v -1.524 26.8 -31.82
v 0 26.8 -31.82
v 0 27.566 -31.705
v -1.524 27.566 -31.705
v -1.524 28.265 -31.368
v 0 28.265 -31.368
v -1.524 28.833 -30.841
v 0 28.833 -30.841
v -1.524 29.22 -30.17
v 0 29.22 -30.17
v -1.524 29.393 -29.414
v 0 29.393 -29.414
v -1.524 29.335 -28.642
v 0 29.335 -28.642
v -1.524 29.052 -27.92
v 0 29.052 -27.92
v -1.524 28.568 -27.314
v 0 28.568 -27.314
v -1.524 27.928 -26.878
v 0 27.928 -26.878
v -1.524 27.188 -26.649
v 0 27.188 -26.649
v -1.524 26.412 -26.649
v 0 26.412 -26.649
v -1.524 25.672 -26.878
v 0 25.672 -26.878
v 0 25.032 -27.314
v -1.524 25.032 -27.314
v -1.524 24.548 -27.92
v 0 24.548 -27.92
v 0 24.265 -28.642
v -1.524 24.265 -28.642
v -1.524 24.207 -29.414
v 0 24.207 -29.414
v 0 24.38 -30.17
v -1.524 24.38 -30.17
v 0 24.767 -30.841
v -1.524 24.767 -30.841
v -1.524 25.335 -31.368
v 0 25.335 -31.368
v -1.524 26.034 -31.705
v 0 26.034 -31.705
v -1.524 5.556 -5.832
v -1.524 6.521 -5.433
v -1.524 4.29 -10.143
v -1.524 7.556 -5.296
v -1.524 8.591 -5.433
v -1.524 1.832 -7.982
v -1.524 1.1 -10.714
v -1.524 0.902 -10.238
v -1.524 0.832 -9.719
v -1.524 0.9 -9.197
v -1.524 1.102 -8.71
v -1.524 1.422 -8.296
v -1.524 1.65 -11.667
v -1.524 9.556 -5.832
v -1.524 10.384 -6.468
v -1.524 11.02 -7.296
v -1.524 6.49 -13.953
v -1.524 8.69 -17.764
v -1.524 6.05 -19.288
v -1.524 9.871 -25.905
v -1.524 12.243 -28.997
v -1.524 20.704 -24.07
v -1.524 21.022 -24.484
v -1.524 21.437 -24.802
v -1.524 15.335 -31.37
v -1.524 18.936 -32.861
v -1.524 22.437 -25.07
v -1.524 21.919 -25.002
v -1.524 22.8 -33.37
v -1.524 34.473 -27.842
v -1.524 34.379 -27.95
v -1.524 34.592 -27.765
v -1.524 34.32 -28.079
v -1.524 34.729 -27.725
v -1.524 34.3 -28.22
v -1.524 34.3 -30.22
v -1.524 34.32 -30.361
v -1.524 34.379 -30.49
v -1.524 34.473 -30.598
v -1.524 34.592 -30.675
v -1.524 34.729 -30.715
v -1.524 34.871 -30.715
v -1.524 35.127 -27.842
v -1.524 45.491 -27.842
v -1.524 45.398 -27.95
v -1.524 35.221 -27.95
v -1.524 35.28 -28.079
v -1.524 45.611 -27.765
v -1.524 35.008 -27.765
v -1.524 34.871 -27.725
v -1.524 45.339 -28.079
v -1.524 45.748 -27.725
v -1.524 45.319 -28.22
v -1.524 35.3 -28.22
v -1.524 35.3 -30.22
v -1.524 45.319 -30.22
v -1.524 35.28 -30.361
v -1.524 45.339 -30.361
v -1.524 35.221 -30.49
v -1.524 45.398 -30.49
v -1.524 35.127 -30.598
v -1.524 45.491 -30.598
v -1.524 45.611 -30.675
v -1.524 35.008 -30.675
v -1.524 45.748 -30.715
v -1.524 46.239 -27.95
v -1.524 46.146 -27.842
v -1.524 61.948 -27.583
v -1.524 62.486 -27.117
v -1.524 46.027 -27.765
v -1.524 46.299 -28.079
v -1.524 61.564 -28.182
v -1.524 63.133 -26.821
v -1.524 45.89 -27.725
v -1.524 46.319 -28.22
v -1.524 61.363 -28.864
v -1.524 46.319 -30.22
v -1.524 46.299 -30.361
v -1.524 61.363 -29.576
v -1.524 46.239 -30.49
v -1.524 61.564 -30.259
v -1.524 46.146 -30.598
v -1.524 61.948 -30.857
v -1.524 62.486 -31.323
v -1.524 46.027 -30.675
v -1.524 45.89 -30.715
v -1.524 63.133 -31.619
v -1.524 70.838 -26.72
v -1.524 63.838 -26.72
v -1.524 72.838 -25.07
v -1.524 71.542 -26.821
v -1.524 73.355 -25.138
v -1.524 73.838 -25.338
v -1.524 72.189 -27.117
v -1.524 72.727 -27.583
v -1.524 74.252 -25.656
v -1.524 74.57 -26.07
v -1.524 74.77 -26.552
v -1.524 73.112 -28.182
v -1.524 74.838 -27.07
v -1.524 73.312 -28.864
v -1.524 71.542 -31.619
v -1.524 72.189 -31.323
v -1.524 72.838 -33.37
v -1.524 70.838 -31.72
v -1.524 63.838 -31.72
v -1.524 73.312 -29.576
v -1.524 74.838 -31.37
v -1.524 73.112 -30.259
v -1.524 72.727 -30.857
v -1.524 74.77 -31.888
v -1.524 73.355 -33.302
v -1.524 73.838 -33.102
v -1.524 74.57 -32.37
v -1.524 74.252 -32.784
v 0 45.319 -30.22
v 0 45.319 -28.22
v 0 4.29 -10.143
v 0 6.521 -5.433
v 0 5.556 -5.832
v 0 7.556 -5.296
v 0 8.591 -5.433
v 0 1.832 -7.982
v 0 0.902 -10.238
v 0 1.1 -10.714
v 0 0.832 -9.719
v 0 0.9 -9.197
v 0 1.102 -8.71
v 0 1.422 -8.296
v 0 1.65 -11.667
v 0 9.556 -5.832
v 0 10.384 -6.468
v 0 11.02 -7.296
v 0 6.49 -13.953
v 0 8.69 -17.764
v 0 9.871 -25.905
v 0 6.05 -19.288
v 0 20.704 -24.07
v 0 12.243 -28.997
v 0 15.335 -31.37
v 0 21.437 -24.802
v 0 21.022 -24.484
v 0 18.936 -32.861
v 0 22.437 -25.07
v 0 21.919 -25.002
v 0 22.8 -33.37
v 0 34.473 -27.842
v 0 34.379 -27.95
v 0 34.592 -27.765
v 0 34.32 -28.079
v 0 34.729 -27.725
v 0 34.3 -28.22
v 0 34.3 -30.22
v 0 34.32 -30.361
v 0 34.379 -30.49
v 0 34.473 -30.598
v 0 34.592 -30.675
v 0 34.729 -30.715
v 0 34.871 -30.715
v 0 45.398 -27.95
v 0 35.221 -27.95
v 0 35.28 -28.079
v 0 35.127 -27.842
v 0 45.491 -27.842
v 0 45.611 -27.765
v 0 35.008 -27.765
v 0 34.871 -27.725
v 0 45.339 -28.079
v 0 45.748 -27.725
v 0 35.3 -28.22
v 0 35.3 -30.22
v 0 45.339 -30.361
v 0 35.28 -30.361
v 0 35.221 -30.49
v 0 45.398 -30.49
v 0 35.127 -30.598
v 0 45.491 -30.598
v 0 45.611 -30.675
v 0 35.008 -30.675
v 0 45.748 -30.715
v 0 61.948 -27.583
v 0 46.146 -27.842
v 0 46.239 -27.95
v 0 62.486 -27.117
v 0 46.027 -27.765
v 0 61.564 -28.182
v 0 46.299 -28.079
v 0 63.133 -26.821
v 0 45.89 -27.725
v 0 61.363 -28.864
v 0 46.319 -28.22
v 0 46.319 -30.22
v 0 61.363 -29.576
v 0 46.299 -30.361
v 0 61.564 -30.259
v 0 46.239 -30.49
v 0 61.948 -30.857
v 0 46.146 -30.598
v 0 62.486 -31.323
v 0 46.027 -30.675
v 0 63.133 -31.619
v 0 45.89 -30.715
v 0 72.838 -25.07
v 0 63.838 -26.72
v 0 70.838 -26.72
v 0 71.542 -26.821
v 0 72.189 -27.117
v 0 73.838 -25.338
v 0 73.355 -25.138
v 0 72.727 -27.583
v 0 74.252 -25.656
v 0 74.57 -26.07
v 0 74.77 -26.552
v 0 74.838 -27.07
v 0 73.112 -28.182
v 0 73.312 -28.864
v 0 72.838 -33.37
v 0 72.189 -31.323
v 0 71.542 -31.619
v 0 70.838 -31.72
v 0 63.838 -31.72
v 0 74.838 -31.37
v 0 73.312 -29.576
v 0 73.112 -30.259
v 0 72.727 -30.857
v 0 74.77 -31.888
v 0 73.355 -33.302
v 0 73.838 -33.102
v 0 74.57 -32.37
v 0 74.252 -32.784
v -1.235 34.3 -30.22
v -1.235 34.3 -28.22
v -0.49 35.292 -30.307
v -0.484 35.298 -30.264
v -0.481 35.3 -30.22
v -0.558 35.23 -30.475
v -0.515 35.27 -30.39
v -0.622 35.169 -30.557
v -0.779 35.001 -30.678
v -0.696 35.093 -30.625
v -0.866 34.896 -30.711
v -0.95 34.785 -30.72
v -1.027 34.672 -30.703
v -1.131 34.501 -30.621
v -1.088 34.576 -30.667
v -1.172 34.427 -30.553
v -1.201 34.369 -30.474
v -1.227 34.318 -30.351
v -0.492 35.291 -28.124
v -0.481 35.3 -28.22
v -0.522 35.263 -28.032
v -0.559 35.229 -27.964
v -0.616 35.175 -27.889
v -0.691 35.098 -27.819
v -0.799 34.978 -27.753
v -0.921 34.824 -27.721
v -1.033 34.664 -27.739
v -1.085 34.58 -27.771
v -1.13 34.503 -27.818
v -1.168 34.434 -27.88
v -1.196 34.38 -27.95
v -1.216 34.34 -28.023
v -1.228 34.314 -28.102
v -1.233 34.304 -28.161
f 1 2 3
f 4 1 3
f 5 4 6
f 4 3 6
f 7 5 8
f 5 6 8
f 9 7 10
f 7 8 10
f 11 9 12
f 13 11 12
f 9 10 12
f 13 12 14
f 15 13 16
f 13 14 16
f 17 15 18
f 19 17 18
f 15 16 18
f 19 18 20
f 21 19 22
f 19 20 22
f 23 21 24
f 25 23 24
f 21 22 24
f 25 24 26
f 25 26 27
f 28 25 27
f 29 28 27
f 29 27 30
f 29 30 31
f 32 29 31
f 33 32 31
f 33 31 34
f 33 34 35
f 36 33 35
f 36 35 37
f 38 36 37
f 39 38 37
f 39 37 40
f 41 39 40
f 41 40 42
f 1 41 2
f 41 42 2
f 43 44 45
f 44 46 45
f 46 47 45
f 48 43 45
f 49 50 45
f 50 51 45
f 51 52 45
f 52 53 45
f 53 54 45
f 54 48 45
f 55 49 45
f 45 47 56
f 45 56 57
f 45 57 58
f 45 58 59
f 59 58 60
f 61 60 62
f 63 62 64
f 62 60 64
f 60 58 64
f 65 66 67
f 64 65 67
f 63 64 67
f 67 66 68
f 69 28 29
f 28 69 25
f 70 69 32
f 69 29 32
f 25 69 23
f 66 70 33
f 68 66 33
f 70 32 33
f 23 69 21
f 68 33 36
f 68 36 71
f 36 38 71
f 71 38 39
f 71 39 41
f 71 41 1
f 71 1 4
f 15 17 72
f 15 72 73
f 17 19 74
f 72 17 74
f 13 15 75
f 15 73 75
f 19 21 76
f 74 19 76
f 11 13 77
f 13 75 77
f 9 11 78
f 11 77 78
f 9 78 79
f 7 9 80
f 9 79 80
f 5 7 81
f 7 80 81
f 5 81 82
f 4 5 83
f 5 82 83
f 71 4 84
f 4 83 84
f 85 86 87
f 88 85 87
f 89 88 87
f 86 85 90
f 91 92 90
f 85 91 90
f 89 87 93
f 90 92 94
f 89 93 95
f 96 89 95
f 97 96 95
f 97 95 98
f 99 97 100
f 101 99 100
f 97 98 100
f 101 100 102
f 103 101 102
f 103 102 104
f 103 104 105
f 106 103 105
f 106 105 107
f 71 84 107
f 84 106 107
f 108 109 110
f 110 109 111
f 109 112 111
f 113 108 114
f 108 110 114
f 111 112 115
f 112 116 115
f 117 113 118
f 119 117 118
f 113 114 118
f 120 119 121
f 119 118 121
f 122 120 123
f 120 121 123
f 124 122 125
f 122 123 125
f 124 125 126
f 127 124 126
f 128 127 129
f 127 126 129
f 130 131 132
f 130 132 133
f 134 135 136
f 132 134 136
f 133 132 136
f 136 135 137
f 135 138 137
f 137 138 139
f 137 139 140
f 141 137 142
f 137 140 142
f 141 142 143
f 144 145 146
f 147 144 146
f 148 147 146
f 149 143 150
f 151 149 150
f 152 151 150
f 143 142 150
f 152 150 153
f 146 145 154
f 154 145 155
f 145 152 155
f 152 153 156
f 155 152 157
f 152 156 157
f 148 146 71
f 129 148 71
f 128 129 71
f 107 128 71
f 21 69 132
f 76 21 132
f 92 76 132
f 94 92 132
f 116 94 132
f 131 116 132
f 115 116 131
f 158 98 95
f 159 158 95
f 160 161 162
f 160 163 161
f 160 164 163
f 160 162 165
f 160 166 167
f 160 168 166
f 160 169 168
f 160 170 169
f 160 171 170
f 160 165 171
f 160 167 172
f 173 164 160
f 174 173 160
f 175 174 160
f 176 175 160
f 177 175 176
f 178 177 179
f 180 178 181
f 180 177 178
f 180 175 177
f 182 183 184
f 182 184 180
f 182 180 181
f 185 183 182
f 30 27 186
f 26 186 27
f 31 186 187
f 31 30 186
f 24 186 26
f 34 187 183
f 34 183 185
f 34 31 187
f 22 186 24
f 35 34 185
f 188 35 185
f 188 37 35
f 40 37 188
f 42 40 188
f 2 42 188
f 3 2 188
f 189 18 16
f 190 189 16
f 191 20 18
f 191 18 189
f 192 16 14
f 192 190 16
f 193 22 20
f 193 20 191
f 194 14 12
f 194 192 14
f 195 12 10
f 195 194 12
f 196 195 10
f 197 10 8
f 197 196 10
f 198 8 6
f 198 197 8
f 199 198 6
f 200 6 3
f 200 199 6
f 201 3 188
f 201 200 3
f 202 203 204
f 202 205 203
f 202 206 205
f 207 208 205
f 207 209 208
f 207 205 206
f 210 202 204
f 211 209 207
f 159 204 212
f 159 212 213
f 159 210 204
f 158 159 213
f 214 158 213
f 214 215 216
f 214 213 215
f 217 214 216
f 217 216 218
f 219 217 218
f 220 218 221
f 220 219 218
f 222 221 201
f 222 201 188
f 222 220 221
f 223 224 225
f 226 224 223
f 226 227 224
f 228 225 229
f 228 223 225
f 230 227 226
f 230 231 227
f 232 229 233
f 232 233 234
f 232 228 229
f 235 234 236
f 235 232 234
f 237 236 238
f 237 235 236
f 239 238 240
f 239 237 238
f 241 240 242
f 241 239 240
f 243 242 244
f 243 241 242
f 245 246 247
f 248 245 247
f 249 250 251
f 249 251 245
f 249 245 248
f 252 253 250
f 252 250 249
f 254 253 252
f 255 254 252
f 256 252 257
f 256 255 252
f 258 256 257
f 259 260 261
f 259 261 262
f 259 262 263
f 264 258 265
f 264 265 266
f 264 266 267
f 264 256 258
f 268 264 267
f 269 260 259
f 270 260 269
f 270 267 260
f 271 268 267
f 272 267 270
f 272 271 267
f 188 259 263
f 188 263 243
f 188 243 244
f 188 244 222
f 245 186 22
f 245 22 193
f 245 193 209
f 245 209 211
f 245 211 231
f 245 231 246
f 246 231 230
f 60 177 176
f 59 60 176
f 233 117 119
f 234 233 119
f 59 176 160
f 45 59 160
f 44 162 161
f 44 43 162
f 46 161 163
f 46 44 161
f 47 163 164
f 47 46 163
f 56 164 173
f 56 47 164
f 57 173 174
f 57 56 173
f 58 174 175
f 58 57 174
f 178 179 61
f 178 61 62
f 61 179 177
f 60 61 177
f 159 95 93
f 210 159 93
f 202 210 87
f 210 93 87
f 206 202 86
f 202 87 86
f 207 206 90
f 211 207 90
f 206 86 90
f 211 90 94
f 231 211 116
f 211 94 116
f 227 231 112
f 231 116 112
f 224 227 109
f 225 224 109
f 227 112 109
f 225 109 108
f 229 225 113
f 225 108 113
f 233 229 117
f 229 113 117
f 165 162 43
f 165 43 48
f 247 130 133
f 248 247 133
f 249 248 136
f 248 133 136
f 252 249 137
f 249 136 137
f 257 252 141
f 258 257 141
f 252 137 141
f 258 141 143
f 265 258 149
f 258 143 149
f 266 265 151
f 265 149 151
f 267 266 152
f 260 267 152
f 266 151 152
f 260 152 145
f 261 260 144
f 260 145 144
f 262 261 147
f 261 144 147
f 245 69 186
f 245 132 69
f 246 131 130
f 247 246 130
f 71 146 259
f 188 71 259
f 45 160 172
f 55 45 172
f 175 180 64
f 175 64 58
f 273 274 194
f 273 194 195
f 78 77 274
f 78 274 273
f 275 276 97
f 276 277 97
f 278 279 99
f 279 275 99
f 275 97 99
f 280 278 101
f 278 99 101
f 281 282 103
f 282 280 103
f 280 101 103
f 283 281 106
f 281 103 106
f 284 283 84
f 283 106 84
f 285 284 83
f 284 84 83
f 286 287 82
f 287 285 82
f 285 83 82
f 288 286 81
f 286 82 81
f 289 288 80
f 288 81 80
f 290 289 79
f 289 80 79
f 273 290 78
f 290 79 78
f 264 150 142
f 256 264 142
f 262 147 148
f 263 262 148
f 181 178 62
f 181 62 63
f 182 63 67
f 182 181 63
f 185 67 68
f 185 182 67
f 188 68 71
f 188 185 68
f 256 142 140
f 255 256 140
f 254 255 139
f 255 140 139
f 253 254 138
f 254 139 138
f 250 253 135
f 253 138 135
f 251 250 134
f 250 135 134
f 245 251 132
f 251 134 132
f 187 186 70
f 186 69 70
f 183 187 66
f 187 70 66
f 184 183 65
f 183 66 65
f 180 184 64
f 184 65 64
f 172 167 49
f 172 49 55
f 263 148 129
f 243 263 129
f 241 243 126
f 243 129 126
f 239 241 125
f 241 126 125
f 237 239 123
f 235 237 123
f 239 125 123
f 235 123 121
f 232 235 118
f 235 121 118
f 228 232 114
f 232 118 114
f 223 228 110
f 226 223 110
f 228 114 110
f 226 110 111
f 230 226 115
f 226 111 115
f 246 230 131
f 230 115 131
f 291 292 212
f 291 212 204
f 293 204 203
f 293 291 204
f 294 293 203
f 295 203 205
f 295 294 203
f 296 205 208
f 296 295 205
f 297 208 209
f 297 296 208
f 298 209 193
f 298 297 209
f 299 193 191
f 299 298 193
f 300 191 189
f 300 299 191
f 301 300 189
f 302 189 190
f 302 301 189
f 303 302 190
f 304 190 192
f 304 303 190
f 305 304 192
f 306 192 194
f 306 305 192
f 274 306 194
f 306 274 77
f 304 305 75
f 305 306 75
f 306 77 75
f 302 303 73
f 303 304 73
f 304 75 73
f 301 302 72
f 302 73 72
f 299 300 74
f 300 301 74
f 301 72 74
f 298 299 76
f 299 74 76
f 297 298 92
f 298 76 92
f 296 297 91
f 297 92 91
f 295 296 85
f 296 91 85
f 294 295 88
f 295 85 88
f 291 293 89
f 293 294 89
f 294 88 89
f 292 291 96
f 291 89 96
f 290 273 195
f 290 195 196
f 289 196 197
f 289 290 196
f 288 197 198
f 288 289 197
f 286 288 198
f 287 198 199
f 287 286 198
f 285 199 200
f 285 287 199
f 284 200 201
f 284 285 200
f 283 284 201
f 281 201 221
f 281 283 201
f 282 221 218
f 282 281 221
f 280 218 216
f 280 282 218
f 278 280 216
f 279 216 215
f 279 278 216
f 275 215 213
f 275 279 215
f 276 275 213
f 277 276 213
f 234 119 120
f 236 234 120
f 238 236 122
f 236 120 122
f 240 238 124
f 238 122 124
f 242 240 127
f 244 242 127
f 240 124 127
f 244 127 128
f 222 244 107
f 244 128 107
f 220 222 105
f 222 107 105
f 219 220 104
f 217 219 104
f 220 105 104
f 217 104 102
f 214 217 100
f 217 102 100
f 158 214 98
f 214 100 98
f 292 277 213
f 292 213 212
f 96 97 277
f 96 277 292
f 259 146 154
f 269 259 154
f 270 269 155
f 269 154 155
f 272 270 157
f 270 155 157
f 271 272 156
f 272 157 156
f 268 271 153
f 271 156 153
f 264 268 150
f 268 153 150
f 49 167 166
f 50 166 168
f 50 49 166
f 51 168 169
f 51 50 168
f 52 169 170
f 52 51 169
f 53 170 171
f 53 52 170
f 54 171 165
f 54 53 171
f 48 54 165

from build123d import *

# Parameters (mm, degrees)
SKETCH1_R            = 2.6
BASE_FLANGE1_DEPTH   = 1.524
KEYING_DEPTH         = 10
FILLET1_R            = 2
FILLET2_R            = 4
JOG1_START           = -33.370112718
JOG1_DEPTH           = 8.3
JOG1_2_DEPTH         = 8.3
JOG1_START_2         = 10.476
JOG1_3_DEPTH         = 1.524
CUT_EXTRUDE1_DEPTH   = 12
CUT_EXTRUDE1_START   = -1.524
CUT_EXTRUDE1_2_DEPTH = 1.524
CUT_EXTRUDE1_3_DEPTH = 1.524


with BuildPart() as part:
    # Base-Flange1: sheet metal written as solids
    # Sketch1 → Base-Flange1 (new body)
    with BuildSketch(Plane(origin=(0, 0, 0), x_dir=(0, 0, -1), z_dir=(1, 0, 0))):
        with BuildLine():
            Line((33.370112718, 22.8), (33.370112718, 64.8))
            Line((33.370112718, 64.8), (25.070112718, 64.8))
            Line((25.070112718, 64.8), (25.070112718, 21.281826676))
            Line((25.070112718, 21.281826676), (3.832112718, 9.020061659))
            Line((3.832112718, 9.020061659), (8.220112718, 1.419822715))
            Line((8.220112718, 1.419822715), (8.982112718, 0.1))
            Line((8.982112718, 0.1), (25.905336052, 9.870627547))
            ThreePointArc((25.905336052, 9.870627547), (31.369931839, 15.335223334), (33.370112718, 22.8))
        make_face()
        with Locations((29.220112718, 26.8)):
            Circle(SKETCH1_R, mode=Mode.SUBTRACT)
        with BuildLine():
            Line((31.720112718, 60.8), (31.720112718, 53.8))
            ThreePointArc((31.720112718, 53.8), (29.220112718, 51.3), (26.720112718, 53.8))
            Line((26.720112718, 53.8), (26.720112718, 60.8))
            ThreePointArc((26.720112718, 60.8), (29.220112718, 63.3), (31.720112718, 60.8))
        make_face(mode=Mode.SUBTRACT)
    extrude(amount=-BASE_FLANGE1_DEPTH)

    # Sketch6 → Keying (cut)
    with BuildSketch(Plane(origin=(0, 0, 0), x_dir=(0, 0, -1), z_dir=(1, 0, 0))):
        Polygon((19.287815023, 6.05), (17.763815023, 8.689645431), (13.953303246, 6.489645431), (10.14279147, 4.289645431), (11.66679147, 1.65), (15.701110868, 3.97921539), align=None)
    extrude(amount=-KEYING_DEPTH, mode=Mode.SUBTRACT)

    # Fillet1
    fillet1_edges = [part.edges().sort_by_distance(p)[0] for p in [
        (-0.762, 0.1, -8.982112718),
        (-0.762, 21.281826676, -25.070112718),
        (-0.762, 64.8, -25.070112718),
        (-0.762, 64.8, -33.370112718),
    ]]
    fillet(fillet1_edges, radius=FILLET1_R)

    # Fillet2
    fillet2_edges = [part.edges().sort_by_distance(p)[0] for p in [
        (-0.762, 9.020061659, -3.832112718),
    ]]
    fillet(fillet2_edges, radius=FILLET2_R)

    # Jog1: read off the stored shape, not the designer's step
    # Jog1 outline → Jog1 (cut)
    with BuildSketch(Plane.XY.offset(JOG1_START)):
        with BuildLine():
            ThreePointArc((-1.524, 33.004579798), (-1.115645431, 34.528579798), (0, 35.644225229))
            Line((0, 35.644225229), (0, 64.8))
            Line((0, 64.8), (-1.524, 64.8))
            Line((-1.524, 64.8), (-1.524, 33.004579798))
        make_face()
    extrude(amount=JOG1_DEPTH, mode=Mode.SUBTRACT)

    # Jog1 2 outline → Jog1 2 (add)
    with BuildSketch(Plane.XY.offset(JOG1_START)):
        with BuildLine():
            ThreePointArc((0, 33.004579798), (0.446369265, 34.082210533), (1.524, 34.528579798))
            Line((1.524, 34.528579798), (8.952, 34.528579798))
            ThreePointArc((8.952, 34.528579798), (11.107261469, 35.421318329), (12, 37.576579798))
            Line((12, 37.576579798), (12, 64.8))
            Line((12, 64.8), (10.476, 64.8))
            Line((10.476, 64.8), (10.476, 37.576579798))
            ThreePointArc((10.476, 37.576579798), (10.029630734, 36.498949063), (8.952, 36.052579798))
            Line((8.952, 36.052579798), (1.524, 36.052579798))
            ThreePointArc((1.524, 36.052579798), (0.73511955, 35.948721717), (0, 35.644225229))
            Line((0, 35.644225229), (0, 33.004579798))
        make_face()
    extrude(amount=JOG1_2_DEPTH)

    # Jog1 3 outline → Jog1 3 (cut)
    with BuildSketch(Plane.YZ.offset(JOG1_START_2)):
        with BuildLine():
            ThreePointArc((62.8, -25.070112718), (64.214213562, -25.655899156), (64.8, -27.070112718))
            Line((64.8, -27.070112718), (64.8, -25.070112718))
            Line((64.8, -25.070112718), (62.8, -25.070112718))
        make_face()
        with BuildLine():
            ThreePointArc((64.8, -31.370112718), (64.214213562, -32.78432628), (62.8, -33.370112718))
            Line((62.8, -33.370112718), (64.8, -33.370112718))
            Line((64.8, -33.370112718), (64.8, -31.370112718))
        make_face()
        with BuildLine():
            Line((60.8, -26.720112718), (53.8, -26.720112718))
            ThreePointArc((53.8, -26.720112718), (51.3, -29.220112718), (53.8, -31.720112718))
            Line((53.8, -31.720112718), (60.8, -31.720112718))
            ThreePointArc((60.8, -31.720112718), (63.3, -29.220112718), (60.8, -26.720112718))
        make_face()
    extrude(amount=JOG1_3_DEPTH, mode=Mode.SUBTRACT)

    # Cut-Extrude1: read off the stored shape, not the designer's step
    # Cut-Extrude1 outline → Cut-Extrude1 (cut)
    with BuildSketch(Plane(origin=(0, 0, 0), x_dir=(0, 0, -1), z_dir=(1, 0, 0))):
        with BuildLine():
            Line((25.070112718, 32), (33.370112718, 32))
            Line((33.370112718, 32), (33.370112718, 62.8))
            ThreePointArc((33.370112718, 62.8), (32.78432628, 64.214213562), (31.370112718, 64.8))
            Line((31.370112718, 64.8), (27.070112718, 64.8))
            ThreePointArc((27.070112718, 64.8), (25.655899156, 64.214213562), (25.070112718, 62.8))
            Line((25.070112718, 62.8), (25.070112718, 32))
        make_face()
        with BuildLine():
            ThreePointArc((26.720112718, 60.8), (29.220112718, 63.3), (31.720112718, 60.8))
            Line((31.720112718, 60.8), (31.720112718, 53.8))
            ThreePointArc((31.720112718, 53.8), (29.220112718, 51.3), (26.720112718, 53.8))
            Line((26.720112718, 53.8), (26.720112718, 60.8))
        make_face(mode=Mode.SUBTRACT)
    extrude(amount=CUT_EXTRUDE1_DEPTH, mode=Mode.SUBTRACT)

    # Cut-Extrude1 2 outline → Cut-Extrude1 2 (cut)
    with BuildSketch(Plane(origin=(0, 0, 0), x_dir=(0, 0, -1), z_dir=(1, 0, 0)).offset(CUT_EXTRUDE1_START)):
        with BuildLine():
            ThreePointArc((28.220112718, 35.3), (27.720112718, 34.8), (28.220112718, 34.3))
            Line((28.220112718, 34.3), (30.220112718, 34.3))
            ThreePointArc((30.220112718, 34.3), (30.720112718, 34.8), (30.220112718, 35.3))
            Line((30.220112718, 35.3), (28.220112718, 35.3))
        make_face()
    extrude(amount=CUT_EXTRUDE1_2_DEPTH, mode=Mode.SUBTRACT)

    # Cut-Extrude1 3 outline → Cut-Extrude1 3 (add)
    with BuildSketch(Plane(origin=(0, 0, 0), x_dir=(0, 0, -1), z_dir=(1, 0, 0)).offset(CUT_EXTRUDE1_START)):
        with BuildLine():
            Line((25.070112718, 32), (33.370112718, 32))
            Line((33.370112718, 32), (33.370112718, 72.837680806))
            ThreePointArc((33.370112718, 72.837680806), (32.78432628, 74.251894368), (31.370112718, 74.837680806))
            Line((31.370112718, 74.837680806), (27.070112718, 74.837680806))
            ThreePointArc((27.070112718, 74.837680806), (25.655899156, 74.251894368), (25.070112718, 72.837680806))
            Line((25.070112718, 72.837680806), (25.070112718, 32))
        make_face()
        with BuildLine():
            ThreePointArc((28.220112718, 34.3), (27.720112718, 34.8), (28.220112718, 35.3))
            Line((28.220112718, 35.3), (30.220112718, 35.3))
            ThreePointArc((30.220112718, 35.3), (30.720112718, 34.8), (30.220112718, 34.3))
            Line((30.220112718, 34.3), (28.220112718, 34.3))
        make_face(mode=Mode.SUBTRACT)
        with BuildLine():
            Line((28.220112718, 46.318840403), (30.220112718, 46.318840403))
            ThreePointArc((30.220112718, 46.318840403), (30.720112718, 45.818840403), (30.220112718, 45.318840403))
            Line((30.220112718, 45.318840403), (28.220112718, 45.318840403))
            ThreePointArc((28.220112718, 45.318840403), (27.720112718, 45.818840403), (28.220112718, 46.318840403))
        make_face(mode=Mode.SUBTRACT)
        with BuildLine():
            Line((26.720112718, 63.837680806), (26.720112718, 70.837680806))
            ThreePointArc((26.720112718, 70.837680806), (29.220112718, 73.337680806), (31.720112718, 70.837680806))
            Line((31.720112718, 70.837680806), (31.720112718, 63.837680806))
            ThreePointArc((31.720112718, 63.837680806), (29.220112718, 61.337680806), (26.720112718, 63.837680806))
        make_face(mode=Mode.SUBTRACT)
    extrude(amount=CUT_EXTRUDE1_3_DEPTH)


solid = part.part
